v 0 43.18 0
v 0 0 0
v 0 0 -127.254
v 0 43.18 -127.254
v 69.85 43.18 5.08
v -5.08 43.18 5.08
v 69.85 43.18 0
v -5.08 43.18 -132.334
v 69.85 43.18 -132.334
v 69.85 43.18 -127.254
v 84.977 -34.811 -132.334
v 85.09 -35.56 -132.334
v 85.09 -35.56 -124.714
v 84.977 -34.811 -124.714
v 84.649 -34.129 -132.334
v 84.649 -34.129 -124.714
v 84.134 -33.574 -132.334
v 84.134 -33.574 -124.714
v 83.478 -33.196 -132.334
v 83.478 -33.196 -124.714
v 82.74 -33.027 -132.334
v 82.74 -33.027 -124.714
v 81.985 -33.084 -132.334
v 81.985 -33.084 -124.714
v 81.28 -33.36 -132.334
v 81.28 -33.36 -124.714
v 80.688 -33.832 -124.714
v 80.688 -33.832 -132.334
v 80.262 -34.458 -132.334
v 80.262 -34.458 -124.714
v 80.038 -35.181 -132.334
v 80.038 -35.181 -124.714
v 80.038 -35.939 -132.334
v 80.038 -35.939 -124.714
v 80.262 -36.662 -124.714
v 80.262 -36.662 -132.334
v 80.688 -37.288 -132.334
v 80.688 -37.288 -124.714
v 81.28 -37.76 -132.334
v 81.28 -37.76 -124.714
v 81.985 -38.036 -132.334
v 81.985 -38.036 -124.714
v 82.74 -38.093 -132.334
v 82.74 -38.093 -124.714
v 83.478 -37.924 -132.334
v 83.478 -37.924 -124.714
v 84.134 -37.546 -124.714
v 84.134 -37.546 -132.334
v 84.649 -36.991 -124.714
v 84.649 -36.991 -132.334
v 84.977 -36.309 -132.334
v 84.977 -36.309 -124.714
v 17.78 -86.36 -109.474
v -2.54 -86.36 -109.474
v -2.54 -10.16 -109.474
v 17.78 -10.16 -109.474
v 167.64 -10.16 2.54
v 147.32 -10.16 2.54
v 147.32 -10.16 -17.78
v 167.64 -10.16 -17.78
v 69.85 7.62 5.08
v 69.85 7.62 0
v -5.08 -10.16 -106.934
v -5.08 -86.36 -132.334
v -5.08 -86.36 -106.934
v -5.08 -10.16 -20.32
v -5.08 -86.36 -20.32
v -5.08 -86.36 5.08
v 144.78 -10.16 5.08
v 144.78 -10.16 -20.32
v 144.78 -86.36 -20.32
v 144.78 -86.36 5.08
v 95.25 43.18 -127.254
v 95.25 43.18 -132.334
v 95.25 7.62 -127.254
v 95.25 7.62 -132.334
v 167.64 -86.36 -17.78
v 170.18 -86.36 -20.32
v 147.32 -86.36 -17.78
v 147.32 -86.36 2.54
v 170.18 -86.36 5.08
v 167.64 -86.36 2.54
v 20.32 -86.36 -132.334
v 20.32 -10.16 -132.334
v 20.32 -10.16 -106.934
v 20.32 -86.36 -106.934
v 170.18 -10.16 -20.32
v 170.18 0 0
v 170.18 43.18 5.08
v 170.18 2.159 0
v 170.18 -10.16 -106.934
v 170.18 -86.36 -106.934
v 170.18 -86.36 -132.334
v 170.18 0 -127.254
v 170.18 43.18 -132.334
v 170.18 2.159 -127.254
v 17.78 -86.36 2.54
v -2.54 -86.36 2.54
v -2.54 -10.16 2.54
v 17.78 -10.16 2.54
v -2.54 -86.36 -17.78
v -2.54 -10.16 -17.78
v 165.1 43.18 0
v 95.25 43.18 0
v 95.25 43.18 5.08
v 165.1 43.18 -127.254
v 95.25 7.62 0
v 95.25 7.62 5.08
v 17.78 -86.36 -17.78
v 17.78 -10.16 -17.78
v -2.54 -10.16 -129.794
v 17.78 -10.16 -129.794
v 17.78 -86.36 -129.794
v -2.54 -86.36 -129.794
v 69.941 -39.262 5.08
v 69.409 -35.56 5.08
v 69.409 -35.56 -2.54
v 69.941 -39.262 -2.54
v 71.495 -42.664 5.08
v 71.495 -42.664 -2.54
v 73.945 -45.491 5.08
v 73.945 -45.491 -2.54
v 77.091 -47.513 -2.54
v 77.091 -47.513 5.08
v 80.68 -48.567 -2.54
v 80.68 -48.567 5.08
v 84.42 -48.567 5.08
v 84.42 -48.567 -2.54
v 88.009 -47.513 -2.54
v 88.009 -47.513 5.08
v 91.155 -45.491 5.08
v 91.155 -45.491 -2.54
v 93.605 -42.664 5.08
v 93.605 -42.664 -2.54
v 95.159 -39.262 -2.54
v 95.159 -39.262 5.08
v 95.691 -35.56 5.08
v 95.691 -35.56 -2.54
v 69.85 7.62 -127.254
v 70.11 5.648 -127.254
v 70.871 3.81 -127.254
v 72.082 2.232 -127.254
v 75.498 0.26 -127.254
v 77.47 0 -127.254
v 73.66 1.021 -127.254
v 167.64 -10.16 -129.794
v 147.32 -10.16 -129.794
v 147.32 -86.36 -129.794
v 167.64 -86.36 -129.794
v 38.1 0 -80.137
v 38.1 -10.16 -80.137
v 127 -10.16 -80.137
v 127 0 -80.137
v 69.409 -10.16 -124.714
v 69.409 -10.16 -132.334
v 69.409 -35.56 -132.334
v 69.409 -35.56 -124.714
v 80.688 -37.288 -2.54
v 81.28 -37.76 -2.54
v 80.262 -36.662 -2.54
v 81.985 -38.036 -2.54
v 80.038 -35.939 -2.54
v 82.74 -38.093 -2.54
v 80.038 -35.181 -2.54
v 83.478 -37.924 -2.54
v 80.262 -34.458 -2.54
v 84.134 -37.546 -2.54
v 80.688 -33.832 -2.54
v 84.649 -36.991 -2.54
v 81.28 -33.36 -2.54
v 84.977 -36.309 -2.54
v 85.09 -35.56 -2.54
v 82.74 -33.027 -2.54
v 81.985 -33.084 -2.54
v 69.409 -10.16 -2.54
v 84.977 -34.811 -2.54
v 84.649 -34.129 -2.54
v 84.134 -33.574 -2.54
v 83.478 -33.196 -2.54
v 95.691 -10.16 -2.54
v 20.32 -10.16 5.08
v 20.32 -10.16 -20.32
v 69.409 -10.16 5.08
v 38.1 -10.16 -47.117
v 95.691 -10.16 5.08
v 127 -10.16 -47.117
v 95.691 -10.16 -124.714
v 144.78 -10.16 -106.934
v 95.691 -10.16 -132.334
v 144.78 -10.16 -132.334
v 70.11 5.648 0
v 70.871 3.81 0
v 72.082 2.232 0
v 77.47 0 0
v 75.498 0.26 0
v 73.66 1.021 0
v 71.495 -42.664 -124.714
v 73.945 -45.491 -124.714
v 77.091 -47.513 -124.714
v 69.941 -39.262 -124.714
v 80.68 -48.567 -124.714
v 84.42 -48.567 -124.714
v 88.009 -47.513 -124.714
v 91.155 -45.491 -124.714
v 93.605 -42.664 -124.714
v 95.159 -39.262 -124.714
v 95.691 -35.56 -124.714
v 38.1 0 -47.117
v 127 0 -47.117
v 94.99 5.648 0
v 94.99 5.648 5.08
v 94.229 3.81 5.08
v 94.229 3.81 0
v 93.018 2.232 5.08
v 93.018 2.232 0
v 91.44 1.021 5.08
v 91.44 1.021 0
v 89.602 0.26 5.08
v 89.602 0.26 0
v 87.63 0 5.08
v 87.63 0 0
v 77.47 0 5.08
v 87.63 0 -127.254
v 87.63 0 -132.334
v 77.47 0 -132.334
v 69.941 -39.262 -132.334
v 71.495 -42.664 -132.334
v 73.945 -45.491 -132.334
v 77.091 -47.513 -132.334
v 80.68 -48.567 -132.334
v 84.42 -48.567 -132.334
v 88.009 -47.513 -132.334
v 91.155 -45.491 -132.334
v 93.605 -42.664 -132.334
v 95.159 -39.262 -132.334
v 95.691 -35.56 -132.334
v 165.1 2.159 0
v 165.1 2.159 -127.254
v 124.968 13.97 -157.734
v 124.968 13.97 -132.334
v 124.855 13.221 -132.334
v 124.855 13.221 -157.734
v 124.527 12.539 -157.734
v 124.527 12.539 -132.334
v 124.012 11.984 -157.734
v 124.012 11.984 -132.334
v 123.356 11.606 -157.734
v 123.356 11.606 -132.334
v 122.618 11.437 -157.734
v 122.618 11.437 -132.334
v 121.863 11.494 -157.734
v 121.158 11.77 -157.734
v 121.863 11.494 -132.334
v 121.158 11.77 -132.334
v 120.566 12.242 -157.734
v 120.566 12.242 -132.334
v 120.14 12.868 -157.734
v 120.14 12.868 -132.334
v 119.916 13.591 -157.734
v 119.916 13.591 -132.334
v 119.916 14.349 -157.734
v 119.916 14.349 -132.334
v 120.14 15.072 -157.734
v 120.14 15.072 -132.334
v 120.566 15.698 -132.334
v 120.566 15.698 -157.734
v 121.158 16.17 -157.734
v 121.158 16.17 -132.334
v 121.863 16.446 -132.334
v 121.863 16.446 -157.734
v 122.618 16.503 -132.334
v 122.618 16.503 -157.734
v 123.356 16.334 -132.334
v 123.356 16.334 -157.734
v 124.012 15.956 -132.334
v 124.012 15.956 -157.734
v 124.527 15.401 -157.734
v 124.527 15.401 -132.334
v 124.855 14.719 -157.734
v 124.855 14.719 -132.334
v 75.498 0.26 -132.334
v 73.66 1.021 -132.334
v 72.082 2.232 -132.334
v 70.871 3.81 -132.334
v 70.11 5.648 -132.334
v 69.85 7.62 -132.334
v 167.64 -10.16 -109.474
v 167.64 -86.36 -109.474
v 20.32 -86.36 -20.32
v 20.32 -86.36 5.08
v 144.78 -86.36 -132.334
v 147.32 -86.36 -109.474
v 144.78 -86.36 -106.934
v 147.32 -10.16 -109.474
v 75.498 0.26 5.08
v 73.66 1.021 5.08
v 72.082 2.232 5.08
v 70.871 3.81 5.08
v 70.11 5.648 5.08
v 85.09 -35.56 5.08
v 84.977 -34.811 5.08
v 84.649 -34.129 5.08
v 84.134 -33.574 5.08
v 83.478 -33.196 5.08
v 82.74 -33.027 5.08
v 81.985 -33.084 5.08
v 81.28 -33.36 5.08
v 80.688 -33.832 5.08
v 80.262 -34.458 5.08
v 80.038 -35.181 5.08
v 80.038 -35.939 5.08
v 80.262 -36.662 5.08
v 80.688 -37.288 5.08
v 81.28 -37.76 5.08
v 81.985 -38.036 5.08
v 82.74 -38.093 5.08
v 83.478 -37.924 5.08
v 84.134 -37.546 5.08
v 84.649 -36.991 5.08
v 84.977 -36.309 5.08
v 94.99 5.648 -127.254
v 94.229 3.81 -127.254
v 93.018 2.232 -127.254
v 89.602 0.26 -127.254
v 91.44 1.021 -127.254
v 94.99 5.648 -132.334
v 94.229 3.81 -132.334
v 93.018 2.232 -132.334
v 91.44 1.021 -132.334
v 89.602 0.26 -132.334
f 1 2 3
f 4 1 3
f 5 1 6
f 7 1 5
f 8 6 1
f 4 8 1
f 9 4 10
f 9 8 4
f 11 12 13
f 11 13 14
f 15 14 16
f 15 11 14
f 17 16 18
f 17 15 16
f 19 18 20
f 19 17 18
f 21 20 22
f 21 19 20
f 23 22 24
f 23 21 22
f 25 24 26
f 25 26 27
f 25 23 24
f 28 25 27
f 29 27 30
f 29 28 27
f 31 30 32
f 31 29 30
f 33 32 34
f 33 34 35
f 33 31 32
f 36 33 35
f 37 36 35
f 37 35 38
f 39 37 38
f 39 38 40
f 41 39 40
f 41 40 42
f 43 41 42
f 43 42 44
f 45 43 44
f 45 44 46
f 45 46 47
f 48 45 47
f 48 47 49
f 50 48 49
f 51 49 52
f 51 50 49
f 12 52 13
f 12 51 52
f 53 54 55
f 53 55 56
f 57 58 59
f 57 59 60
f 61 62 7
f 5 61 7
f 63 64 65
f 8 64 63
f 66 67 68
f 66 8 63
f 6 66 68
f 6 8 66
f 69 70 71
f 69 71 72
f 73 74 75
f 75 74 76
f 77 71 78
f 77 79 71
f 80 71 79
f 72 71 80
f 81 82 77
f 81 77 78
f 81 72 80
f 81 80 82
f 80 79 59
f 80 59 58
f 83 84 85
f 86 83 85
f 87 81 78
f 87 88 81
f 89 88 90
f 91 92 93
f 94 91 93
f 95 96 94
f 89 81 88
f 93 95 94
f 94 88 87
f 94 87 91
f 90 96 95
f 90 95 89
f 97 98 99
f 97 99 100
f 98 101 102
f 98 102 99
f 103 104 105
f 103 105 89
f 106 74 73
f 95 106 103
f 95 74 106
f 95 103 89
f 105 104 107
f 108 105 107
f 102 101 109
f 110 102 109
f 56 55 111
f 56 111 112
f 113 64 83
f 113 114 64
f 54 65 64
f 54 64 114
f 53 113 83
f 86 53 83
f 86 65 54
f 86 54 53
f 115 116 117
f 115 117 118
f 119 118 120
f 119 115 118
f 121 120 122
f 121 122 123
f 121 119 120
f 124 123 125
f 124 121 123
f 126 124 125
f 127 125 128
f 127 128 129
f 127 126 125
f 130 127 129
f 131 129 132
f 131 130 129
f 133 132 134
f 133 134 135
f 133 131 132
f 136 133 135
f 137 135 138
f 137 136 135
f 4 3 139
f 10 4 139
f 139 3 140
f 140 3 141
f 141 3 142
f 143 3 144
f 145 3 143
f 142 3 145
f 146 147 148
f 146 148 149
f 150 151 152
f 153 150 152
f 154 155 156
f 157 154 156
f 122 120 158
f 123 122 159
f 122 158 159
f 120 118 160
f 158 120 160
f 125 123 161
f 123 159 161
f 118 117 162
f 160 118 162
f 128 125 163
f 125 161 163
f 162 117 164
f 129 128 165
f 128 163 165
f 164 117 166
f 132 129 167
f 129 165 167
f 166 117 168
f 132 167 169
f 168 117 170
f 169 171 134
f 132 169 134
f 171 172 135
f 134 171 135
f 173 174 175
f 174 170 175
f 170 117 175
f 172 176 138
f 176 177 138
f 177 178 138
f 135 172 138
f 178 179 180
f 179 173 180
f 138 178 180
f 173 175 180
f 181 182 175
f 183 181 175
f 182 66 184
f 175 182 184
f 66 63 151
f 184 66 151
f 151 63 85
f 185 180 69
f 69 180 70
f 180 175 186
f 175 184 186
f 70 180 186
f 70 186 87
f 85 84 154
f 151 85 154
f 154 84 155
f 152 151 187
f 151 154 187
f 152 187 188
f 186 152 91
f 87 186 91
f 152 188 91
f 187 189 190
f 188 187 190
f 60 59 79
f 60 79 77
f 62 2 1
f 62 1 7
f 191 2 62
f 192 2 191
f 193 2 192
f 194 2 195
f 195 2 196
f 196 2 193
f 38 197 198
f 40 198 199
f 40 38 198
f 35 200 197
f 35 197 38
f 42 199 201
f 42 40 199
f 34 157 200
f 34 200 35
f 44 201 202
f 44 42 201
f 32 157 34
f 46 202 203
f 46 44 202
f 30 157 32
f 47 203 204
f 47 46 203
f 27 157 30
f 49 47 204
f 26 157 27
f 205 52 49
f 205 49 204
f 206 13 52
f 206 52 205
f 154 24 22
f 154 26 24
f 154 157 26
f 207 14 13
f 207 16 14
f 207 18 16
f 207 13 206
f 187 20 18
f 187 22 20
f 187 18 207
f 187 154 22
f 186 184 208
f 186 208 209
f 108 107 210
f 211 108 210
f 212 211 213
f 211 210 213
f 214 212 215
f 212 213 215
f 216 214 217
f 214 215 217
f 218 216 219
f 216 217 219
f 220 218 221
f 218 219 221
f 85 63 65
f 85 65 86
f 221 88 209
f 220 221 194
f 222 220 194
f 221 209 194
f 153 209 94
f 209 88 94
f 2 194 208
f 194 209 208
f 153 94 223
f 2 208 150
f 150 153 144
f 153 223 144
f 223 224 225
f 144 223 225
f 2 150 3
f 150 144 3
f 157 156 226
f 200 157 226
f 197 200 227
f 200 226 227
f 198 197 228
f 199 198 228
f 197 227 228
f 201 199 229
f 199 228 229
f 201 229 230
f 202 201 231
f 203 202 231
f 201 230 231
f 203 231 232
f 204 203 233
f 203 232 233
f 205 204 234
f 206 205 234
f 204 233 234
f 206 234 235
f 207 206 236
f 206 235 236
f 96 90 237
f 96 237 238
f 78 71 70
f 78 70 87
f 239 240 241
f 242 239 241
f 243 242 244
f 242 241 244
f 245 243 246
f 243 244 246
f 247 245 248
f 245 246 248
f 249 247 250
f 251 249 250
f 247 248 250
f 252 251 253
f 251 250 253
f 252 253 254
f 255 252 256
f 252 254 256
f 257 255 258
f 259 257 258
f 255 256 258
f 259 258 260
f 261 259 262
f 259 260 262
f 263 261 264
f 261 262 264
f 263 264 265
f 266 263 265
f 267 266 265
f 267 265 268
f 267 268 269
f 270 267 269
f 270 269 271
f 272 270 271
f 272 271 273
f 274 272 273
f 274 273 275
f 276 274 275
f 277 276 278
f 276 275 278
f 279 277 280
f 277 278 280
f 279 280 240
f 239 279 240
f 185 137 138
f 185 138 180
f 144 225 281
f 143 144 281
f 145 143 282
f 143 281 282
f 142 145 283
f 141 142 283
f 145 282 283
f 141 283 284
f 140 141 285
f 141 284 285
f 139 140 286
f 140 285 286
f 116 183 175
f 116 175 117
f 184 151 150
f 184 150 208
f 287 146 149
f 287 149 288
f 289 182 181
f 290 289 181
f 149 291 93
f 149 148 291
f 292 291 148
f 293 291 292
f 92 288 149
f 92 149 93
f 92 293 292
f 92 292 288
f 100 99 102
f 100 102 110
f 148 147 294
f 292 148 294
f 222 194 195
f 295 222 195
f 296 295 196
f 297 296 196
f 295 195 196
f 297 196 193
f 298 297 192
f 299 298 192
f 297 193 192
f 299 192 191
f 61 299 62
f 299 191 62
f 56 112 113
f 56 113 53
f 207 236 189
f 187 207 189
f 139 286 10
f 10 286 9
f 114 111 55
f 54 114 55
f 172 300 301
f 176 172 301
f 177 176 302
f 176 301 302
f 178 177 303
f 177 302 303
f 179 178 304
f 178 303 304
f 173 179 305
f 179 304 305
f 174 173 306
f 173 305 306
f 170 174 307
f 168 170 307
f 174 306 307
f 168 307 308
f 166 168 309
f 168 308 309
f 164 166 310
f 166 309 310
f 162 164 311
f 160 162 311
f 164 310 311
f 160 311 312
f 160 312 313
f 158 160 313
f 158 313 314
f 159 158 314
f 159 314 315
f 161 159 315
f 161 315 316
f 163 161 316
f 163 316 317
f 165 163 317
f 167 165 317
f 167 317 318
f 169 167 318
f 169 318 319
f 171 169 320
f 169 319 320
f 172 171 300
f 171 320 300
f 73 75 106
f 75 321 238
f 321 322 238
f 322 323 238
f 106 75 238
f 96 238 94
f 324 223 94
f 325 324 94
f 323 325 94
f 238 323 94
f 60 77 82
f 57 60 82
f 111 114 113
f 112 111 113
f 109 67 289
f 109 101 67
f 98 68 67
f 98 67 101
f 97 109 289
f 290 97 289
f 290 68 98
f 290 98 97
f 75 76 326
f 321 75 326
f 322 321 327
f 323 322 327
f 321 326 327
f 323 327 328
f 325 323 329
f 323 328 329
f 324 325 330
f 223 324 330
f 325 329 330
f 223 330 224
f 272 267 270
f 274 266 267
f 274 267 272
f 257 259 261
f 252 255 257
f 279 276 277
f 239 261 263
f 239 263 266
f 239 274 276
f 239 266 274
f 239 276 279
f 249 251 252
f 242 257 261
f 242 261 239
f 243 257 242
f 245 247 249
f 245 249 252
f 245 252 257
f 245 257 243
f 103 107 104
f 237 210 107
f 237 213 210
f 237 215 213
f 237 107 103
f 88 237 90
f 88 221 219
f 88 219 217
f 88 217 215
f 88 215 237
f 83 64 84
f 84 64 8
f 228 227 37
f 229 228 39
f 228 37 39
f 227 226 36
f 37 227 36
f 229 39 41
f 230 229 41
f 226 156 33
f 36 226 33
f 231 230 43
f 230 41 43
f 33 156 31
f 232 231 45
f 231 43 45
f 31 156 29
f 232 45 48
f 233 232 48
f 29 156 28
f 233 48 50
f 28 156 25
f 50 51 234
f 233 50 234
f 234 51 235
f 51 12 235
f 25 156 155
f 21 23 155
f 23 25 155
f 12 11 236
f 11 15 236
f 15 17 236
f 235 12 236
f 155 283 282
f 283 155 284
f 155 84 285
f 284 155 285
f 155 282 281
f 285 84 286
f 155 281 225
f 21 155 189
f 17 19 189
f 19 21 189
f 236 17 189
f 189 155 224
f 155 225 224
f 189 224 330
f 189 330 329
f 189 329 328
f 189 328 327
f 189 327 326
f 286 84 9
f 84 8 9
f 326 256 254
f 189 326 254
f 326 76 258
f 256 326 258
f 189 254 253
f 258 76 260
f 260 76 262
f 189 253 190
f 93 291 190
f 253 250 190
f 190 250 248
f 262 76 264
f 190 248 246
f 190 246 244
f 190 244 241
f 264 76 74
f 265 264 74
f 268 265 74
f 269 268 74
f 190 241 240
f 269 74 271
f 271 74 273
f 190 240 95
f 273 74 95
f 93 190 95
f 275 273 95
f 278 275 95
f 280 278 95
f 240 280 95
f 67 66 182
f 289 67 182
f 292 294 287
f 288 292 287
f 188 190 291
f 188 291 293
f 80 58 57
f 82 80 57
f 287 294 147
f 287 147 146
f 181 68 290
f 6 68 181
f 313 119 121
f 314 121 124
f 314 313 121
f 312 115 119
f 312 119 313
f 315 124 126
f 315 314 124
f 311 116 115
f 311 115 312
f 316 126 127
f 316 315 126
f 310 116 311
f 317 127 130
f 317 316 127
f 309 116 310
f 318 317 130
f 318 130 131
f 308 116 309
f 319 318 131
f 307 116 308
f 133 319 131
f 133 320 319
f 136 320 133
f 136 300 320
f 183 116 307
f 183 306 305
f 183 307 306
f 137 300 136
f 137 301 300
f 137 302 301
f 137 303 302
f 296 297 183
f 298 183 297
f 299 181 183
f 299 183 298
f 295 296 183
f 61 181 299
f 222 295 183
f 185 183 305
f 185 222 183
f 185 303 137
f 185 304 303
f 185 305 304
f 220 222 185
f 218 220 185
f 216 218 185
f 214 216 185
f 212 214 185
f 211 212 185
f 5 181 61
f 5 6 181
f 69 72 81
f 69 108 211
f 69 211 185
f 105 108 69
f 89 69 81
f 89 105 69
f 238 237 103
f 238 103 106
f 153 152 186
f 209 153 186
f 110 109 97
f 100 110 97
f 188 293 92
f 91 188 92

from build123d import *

# Parameters (mm, degrees)
SKETCH5_W               = 175.26
SKETCH5_H               = 137.414
SKETCH5_W_2             = 165.1
SKETCH5_H_2             = 127.254
BOSS_EXTRUDE2_DEPTH     = 43.18
SKETCH7_W               = 175.26
SKETCH7_H               = 137.414
BOSS_EXTRUDE4_DEPTH     = 10.16
SKETCH9_W               = 127.254
SKETCH9_H               = 2.159
CUT_EXTRUDE1_DEPTH      = 8.128
CUT_EXTRUDE2_DEPTH      = 13.208
CUT_EXTRUDE2_DEPTH_BACK = 147.066
SKETCH11_W              = 88.9
SKETCH11_H              = 33.02
CUT_EXTRUDE3_DEPTH      = 10.16
SKETCH12_W              = 25.4
SKETCH12_H              = 25.4
BOSS_EXTRUDE5_DEPTH     = 76.2
SKETCH13_W              = 20.32
SKETCH13_H              = 20.32
CUT_EXTRUDE4_DEPTH      = 76.2
SKETCH14_R              = 2.54
BOSS_EXTRUDE6_DEPTH     = 7.62
SKETCH15_R              = 2.54
BOSS_EXTRUDE7_DEPTH     = 25.4


with BuildPart() as part:
    # Sketch5 → Boss-Extrude2 (new body)
    with BuildSketch(Plane(origin=(0, 0, 0), x_dir=(1, 0, 0), z_dir=(0, 1, 0))):
        with Locations((82.55, 63.627)):
            Rectangle(SKETCH5_W, SKETCH5_H)
        with Locations((82.55, 63.627)):
            Rectangle(SKETCH5_W_2, SKETCH5_H_2, mode=Mode.SUBTRACT)
    extrude(amount=BOSS_EXTRUDE2_DEPTH)

    # Sketch7 → Boss-Extrude4 (add)
    with BuildSketch(Plane(origin=(0, 0, 0), x_dir=(1, 0, 0), z_dir=(0, 1, 0))):
        with Locations((82.55, 63.627)):
            Rectangle(SKETCH7_W, SKETCH7_H)
    extrude(amount=-BOSS_EXTRUDE4_DEPTH)

    # Sketch9 → Cut-Extrude1 (cut)
    with BuildSketch(Plane(origin=(170.18, 0, 0), x_dir=(0, 0, -1), z_dir=(1, 0, 0))):
        with Locations((63.627, 1.0795)):
            Rectangle(SKETCH9_W, SKETCH9_H)
    extrude(amount=-CUT_EXTRUDE1_DEPTH, mode=Mode.SUBTRACT)

    # Sketch10 → Cut-Extrude2 (cut, two sides: drawn at the far end of the back side and taken through both)
    with BuildSketch(Plane.XY.offset(5.08).offset(-CUT_EXTRUDE2_DEPTH_BACK)):
        with BuildLine():
            Line((69.85, 43.18), (95.25, 43.18))
            Line((95.25, 43.18), (95.25, 7.62))
            ThreePointArc((95.25, 7.62), (93.018153673, 2.231846327), (87.63, 0))
            Line((87.63, 0), (77.47, 0))
            ThreePointArc((77.47, 0), (72.081846327, 2.231846327), (69.85, 7.62))
            Line((69.85, 7.62), (69.85, 43.18))
        make_face()
    extrude(amount=CUT_EXTRUDE2_DEPTH + CUT_EXTRUDE2_DEPTH_BACK, mode=Mode.SUBTRACT)

    # Sketch11 → Cut-Extrude3 (cut)
    with BuildSketch(Plane.XZ.offset(10.16)):
        with Locations((82.55, -63.627)):
            Rectangle(SKETCH11_W, SKETCH11_H)
    extrude(amount=-CUT_EXTRUDE3_DEPTH, mode=Mode.SUBTRACT)

    # Sketch12 → Boss-Extrude5 (add)
    with BuildSketch(Plane.XZ.offset(10.16)):
        with Locations((7.62, -7.62)):
            Rectangle(SKETCH12_W, SKETCH12_H)
        with Locations((157.48, -7.62)):
            Rectangle(SKETCH12_W, SKETCH12_H)
        with Locations((157.48, -119.634)):
            Rectangle(SKETCH12_W, SKETCH12_H)
        with Locations((7.62, -119.634)):
            Rectangle(SKETCH12_W, SKETCH12_H)
    extrude(amount=BOSS_EXTRUDE5_DEPTH)

    # Sketch13 → Cut-Extrude4 (cut)
    with BuildSketch(Plane.XZ.offset(86.36)):
        with Locations((7.62, -7.62)):
            Rectangle(SKETCH13_W, SKETCH13_H)
        with Locations((157.48, -7.62)):
            Rectangle(SKETCH13_W, SKETCH13_H)
        with Locations((157.48, -119.634)):
            Rectangle(SKETCH13_W, SKETCH13_H)
        with Locations((7.62, -119.634)):
            Rectangle(SKETCH13_W, SKETCH13_H)
    extrude(amount=-CUT_EXTRUDE4_DEPTH, mode=Mode.SUBTRACT)

    # Sketch14 → Boss-Extrude6 (add)
    with BuildSketch(Plane.XY.offset(5.08)):
        with BuildLine():
            Line((69.409163099, -10.16), (69.409163099, -35.56))
            ThreePointArc((69.409163099, -35.56), (82.55, -48.700836901), (95.690836901, -35.56))
            Line((95.690836901, -35.56), (95.690836901, -10.16))
            Line((95.690836901, -10.16), (69.409163099, -10.16))
        make_face()
        with Locations((82.55, -35.56)):
            Circle(SKETCH14_R, mode=Mode.SUBTRACT)
    boss_extrude6 = extrude(amount=-BOSS_EXTRUDE6_DEPTH)

    # Mirror2: Boss-Extrude6 across plane
    add(boss_extrude6.mirror(Plane.XY.offset(-63.627)))

    # Sketch15 → Boss-Extrude7 (add)
    with BuildSketch(Plane(origin=(0, 0, -132.334), x_dir=(-1, 0, 0), z_dir=(0, 0, -1))):
        with Locations(Location((-122.428, 13.97, 0), (0, 0, 180))):
            Circle(SKETCH15_R)
    extrude(amount=BOSS_EXTRUDE7_DEPTH)


solid = part.part
